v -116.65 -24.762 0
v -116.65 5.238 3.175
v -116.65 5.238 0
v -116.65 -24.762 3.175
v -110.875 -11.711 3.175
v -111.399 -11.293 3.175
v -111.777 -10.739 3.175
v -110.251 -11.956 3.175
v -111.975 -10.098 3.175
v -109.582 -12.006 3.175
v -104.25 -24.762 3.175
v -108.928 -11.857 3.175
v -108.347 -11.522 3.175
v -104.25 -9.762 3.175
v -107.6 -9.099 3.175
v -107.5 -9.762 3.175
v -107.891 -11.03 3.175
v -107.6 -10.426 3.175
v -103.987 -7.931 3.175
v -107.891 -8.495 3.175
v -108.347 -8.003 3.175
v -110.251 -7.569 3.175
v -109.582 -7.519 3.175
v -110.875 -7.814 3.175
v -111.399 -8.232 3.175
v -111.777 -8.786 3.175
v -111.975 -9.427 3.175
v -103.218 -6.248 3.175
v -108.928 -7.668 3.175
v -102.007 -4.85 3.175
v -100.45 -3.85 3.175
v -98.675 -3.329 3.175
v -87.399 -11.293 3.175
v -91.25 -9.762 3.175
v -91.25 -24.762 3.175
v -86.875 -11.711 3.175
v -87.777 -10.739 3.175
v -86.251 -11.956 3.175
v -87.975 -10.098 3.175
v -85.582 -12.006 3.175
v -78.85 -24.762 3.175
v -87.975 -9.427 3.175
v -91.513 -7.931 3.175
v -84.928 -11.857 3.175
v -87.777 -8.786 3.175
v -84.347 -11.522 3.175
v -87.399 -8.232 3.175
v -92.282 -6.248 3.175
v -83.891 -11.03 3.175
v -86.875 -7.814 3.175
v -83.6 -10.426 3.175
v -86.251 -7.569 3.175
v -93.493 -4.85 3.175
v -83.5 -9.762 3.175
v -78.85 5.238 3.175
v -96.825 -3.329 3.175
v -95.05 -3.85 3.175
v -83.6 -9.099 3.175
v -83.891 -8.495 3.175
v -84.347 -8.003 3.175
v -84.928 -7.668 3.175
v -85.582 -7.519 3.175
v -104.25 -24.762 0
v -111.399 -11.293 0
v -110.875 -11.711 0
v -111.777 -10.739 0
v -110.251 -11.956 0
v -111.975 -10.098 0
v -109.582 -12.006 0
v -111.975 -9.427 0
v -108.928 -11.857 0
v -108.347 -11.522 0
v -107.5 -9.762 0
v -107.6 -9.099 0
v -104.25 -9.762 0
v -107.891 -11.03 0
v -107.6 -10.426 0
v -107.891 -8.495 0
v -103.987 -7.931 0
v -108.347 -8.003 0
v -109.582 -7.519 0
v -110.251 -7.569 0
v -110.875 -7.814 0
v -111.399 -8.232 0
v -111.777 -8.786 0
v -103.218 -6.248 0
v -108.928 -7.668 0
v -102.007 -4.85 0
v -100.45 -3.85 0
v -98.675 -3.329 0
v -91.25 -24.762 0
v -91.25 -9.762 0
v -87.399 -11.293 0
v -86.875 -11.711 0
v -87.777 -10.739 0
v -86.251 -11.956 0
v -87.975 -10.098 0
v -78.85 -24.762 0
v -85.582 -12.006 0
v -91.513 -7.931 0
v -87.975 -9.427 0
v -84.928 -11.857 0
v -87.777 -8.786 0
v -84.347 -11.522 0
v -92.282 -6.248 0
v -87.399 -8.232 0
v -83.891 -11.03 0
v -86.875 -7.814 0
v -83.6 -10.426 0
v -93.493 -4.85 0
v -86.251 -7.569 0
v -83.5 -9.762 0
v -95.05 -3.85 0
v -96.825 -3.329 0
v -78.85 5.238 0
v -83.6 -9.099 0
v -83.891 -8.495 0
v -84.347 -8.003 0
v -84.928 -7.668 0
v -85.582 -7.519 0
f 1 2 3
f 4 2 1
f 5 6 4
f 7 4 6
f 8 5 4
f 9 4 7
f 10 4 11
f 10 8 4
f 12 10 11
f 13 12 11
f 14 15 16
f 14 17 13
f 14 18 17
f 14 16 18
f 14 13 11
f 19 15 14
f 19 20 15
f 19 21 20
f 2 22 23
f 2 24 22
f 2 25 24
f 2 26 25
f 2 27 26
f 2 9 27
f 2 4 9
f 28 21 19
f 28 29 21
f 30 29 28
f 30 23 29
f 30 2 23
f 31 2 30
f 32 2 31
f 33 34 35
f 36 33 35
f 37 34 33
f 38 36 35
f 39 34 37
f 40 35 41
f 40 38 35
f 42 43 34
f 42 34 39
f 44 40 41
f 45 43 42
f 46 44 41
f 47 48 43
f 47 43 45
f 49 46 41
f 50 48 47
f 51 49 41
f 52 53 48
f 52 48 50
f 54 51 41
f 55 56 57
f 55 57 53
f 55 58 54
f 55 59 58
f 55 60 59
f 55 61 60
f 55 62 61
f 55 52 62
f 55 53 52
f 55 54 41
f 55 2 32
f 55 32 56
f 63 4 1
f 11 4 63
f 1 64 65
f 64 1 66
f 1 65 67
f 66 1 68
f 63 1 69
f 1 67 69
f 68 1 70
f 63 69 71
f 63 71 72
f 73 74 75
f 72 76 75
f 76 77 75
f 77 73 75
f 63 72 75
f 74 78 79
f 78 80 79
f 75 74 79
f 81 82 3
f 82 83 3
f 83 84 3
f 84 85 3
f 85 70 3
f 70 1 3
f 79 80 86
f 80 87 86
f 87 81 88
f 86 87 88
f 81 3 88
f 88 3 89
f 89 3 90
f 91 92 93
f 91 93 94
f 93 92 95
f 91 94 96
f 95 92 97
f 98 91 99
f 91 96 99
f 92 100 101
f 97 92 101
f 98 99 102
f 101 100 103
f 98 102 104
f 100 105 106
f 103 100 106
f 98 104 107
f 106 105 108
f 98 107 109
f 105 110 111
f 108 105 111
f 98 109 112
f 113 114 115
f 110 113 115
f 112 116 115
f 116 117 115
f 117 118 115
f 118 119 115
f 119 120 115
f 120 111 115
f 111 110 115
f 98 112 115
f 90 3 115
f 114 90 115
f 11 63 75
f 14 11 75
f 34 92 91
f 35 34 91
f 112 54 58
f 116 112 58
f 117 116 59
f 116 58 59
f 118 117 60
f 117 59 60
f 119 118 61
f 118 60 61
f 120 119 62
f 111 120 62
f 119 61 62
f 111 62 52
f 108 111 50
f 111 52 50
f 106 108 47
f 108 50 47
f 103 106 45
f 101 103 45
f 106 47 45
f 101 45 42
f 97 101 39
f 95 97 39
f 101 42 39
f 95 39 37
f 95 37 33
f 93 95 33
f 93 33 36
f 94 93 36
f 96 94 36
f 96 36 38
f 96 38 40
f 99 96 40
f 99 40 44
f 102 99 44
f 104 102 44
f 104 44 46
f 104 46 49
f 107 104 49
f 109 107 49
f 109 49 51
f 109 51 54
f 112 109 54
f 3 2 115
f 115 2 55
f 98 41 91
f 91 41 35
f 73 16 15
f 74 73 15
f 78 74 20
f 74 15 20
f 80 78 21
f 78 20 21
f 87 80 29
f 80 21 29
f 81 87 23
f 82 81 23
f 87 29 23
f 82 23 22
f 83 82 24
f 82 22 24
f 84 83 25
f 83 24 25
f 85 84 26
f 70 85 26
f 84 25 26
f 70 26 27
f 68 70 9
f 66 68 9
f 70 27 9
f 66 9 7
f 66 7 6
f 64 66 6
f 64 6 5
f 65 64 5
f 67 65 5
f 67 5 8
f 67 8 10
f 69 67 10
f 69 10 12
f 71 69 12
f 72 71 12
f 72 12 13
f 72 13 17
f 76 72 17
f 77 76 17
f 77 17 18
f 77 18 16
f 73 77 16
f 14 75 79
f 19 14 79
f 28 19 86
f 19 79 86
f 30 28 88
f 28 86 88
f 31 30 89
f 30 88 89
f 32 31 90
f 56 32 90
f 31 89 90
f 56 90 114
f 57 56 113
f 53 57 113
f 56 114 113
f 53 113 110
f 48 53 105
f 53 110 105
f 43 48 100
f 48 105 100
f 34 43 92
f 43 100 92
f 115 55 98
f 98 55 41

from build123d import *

# Parameters (mm, degrees)
SKETCH1_W            = 299.7
SKETCH1_H            = 76.075
BOSS_EXTRUDE1_DEPTH  = 3.175
CUT_EXTRUDE4_DEPTH   = 155.634907221
SKETCH3_R            = 6.5
CUT_EXTRUDE5_DEPTH   = 155.634907221
M4_CLEARANCE_HOLE1_D = 4.5
SKETCH12_W           = 144
SKETCH12_H           = 3.175
BOSS_EXTRUDE2_DEPTH  = 6.35
SKETCH14_R           = 2.25
SKETCH14_W           = 12.4
SKETCH14_H           = 13.275
CUT_EXTRUDE7_DEPTH   = 157.318115653


with BuildPart() as part:
    # Sketch1 → Boss-Extrude1 (new body)
    with BuildSketch(Plane.XY):
        Rectangle(SKETCH1_W, SKETCH1_H)
    extrude(amount=BOSS_EXTRUDE1_DEPTH)

    # Sketch8 → Cut-Extrude4 (cut, through all)
    with BuildSketch(Plane.XY.offset(3.175)):
        with BuildLine():
            Line((121.65, 18.5125), (123.65, 18.5125))
            ThreePointArc((123.65, 18.5125), (127.185533906, 17.048033906), (128.65, 13.5125))
            Line((128.65, 13.5125), (128.65, -27.282435401))
            ThreePointArc((128.65, -27.282435401), (127.185533906, -30.817969307), (123.65, -32.282435401))
            Line((123.65, -32.282435401), (121.65, -32.282435401))
            ThreePointArc((121.65, -32.282435401), (118.114466094, -30.817969307), (116.65, -27.282435401))
            Line((116.65, -27.282435401), (116.65, 13.5125))
            ThreePointArc((116.65, 13.5125), (118.114466094, 17.048033906), (121.65, 18.5125))
        make_face()
        with BuildLine():
            Line((128.65, -38.0375), (128.65, -27.282435401))
            ThreePointArc((128.65, -27.282435401), (127.185533906, -30.817969307), (123.65, -32.282435401))
            Line((123.65, -32.282435401), (121.65, -32.282435401))
            ThreePointArc((121.65, -32.282435401), (118.114466094, -30.817969307), (116.65, -27.282435401))
            Line((116.65, -27.282435401), (116.65, -38.0375))
            Line((116.65, -38.0375), (128.65, -38.0375))
        make_face()
    cut_extrude4 = extrude(amount=-CUT_EXTRUDE4_DEPTH, mode=Mode.SUBTRACT)

    # Mirror3: Cut-Extrude4 across plane
    add(cut_extrude4.mirror(Plane(origin=(0, 0, 0), x_dir=(0, 0, 1), z_dir=(1, 0, 0))), mode=Mode.SUBTRACT)

    # Sketch3 → Cut-Extrude5 (cut, through all)
    with BuildSketch(Plane(origin=(0, 0, 0), x_dir=(-1, 0, 0), z_dir=(0, 0, -1))):
        with Locations((-97.75, -9.7625)):
            Circle(SKETCH3_R)
        with BuildLine():
            Line((-104.25, -38.0375), (-91.25, -38.0375))
            Line((-91.25, -38.0375), (-91.25, -9.7625))
            ThreePointArc((-91.25, -9.7625), (-97.75, -16.2625), (-104.25, -9.7625))
            Line((-104.25, -9.7625), (-104.25, -38.0375))
        make_face()
        with Locations((97.75, -9.7625)):
            Circle(SKETCH3_R)
        with BuildLine():
            Line((91.25, -38.0375), (104.25, -38.0375))
            Line((104.25, -38.0375), (104.25, -9.7625))
            ThreePointArc((104.25, -9.7625), (97.75, -16.2625), (91.25, -9.7625))
            Line((91.25, -9.7625), (91.25, -38.0375))
        make_face()
    extrude(amount=-CUT_EXTRUDE5_DEPTH, mode=Mode.SUBTRACT)

    # M4 Clearance Hole1 (through all)
    with Locations(Plane(origin=(0, 0, 0), x_dir=(-1, 0, 0), z_dir=(0, 0, -1))):
        with Locations((-85.75, -9.7625), (-109.75, -9.7625), (109.75, -9.7625), (85.75, -9.7625)):
            Hole(M4_CLEARANCE_HOLE1_D / 2)

    # Sketch12 → Boss-Extrude2 (add)
    with BuildSketch(Plane.XZ.offset(38.0375)):
        with Locations((0, 1.5875)):
            Rectangle(SKETCH12_W, SKETCH12_H)
    extrude(amount=BOSS_EXTRUDE2_DEPTH)

    # Sketch14 → Cut-Extrude7 (cut, through all)
    # profile 1 of 2: a face of its own
    with BuildSketch(Plane.XY.offset(3.175)):
        with BuildLine():
            Line((-78.85, -24.7625), (-91.25, -24.7625))
            Line((-91.25, -24.7625), (-91.25, -38.0375))
            Line((-91.25, -38.0375), (-72, -38.0375))
            Line((-72, -38.0375), (-72, -44.3875))
            Line((-72, -44.3875), (72, -44.3875))
            Line((72, -44.3875), (72, -38.0375))
            Line((72, -38.0375), (91.25, -38.0375))
            Line((91.25, -38.0375), (91.25, -9.7625))
            ThreePointArc((91.25, -9.7625), (97.75, -3.2625), (104.25, -9.7625))
            Line((104.25, -9.7625), (104.25, -38.0375))
            Line((104.25, -38.0375), (116.65, -38.0375))
            Line((116.65, -38.0375), (116.65, 13.5125))
            ThreePointArc((116.65, 13.5125), (118.114466094, 17.048033906), (121.65, 18.5125))
            Line((121.65, 18.5125), (123.65, 18.5125))
            ThreePointArc((123.65, 18.5125), (127.185533906, 17.048033906), (128.65, 13.5125))
            Line((128.65, 13.5125), (128.65, -38.0375))
            Line((128.65, -38.0375), (149.85, -38.0375))
            Line((149.85, -38.0375), (149.85, 38.0375))
            Line((149.85, 38.0375), (-149.85, 38.0375))
            Line((-149.85, 38.0375), (-149.85, -38.0375))
            Line((-149.85, -38.0375), (-128.65, -38.0375))
            Line((-128.65, -38.0375), (-128.65, 13.5125))
            ThreePointArc((-128.65, 13.5125), (-127.185533906, 17.048033906), (-123.65, 18.5125))
            Line((-123.65, 18.5125), (-121.65, 18.5125))
            ThreePointArc((-121.65, 18.5125), (-118.114466094, 17.048033906), (-116.65, 13.5125))
            Line((-116.65, 13.5125), (-116.65, 5.2375))
            Line((-116.65, 5.2375), (-78.85, 5.2375))
            Line((-78.85, 5.2375), (-78.85, -24.7625))
        make_face()
        with Locations((85.75, -9.7625)):
            Circle(SKETCH14_R, mode=Mode.SUBTRACT)
        with Locations((109.75, -9.7625)):
            Circle(SKETCH14_R, mode=Mode.SUBTRACT)
    # profile 2 of 2: a face of its own
    with BuildSketch(Plane.XY.offset(3.175)):
        with Locations((-110.45, -31.4)):
            Rectangle(SKETCH14_W, SKETCH14_H)
    extrude(amount=-CUT_EXTRUDE7_DEPTH, mode=Mode.SUBTRACT)


solid = part.part
